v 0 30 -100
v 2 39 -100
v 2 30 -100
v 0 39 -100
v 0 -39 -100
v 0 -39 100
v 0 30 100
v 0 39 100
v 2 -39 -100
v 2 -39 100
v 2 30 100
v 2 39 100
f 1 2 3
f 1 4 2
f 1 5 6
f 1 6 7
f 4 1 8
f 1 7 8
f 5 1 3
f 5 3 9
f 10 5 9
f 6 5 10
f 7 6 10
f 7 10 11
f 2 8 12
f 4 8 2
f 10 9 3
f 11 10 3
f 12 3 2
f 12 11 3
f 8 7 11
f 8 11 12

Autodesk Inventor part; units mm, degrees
ref_plane "YZ Plane" through (0, 0, 0) normal (1, 0, 0) x (0, 1, 0)
ref_plane "XZ Plane" through (0, 0, 0) normal (0, 1, 0) x (-1, 0, 0)
ref_plane "XY Plane" through (0, 0, 0) normal (0, 0, 1) x (1, 0, 0)
sketch "Sketch1" plane through (0, 0, 0) normal (1, 0, 0) x (0, 1, 0)
  line L0 (-39, 100) -> (39, 100)
  line L1 (39, 100) -> (39, -100)
  line L2 (39, -100) -> (-39, -100)
  line L3 (-39, -100) -> (-39, 100)
  line L4 (-39, 100) -> (39, -100) construction
  line L5 (39, 100) -> (-39, -100) construction
  line L6 (39, 100) -> (30, 100)
  line L7 (39, -100) -> (30, -100)
  point P0 (0, 0)
  point P1 (0, 0)
  dimension "d0" = 200
  dimension "d6" = 78
extrude "Plate1" add sketch "Sketch1" along normal blind 2
equation "\"d5\" = Thickness"
equation "\"BendRadius\" = Thickness"
equation "\"BendReliefWidth\" = Thickness"
equation "\"BendReliefDepth\" = 0.5 * Thickness"
equation "\"CornerReliefSize\" = 4 * Thickness"
equation "\"MinimumRemnant\" = 2 * Thickness"
equation "\"TransitionRadius\" = BendRadius"
equation "\"JacobiRadiusSize\" = BendRadius"
equation "\"GapSize\" = Thickness"
equation "\"Thickness\" = 2"
properties part number "AI-Cover" material "Steel"
